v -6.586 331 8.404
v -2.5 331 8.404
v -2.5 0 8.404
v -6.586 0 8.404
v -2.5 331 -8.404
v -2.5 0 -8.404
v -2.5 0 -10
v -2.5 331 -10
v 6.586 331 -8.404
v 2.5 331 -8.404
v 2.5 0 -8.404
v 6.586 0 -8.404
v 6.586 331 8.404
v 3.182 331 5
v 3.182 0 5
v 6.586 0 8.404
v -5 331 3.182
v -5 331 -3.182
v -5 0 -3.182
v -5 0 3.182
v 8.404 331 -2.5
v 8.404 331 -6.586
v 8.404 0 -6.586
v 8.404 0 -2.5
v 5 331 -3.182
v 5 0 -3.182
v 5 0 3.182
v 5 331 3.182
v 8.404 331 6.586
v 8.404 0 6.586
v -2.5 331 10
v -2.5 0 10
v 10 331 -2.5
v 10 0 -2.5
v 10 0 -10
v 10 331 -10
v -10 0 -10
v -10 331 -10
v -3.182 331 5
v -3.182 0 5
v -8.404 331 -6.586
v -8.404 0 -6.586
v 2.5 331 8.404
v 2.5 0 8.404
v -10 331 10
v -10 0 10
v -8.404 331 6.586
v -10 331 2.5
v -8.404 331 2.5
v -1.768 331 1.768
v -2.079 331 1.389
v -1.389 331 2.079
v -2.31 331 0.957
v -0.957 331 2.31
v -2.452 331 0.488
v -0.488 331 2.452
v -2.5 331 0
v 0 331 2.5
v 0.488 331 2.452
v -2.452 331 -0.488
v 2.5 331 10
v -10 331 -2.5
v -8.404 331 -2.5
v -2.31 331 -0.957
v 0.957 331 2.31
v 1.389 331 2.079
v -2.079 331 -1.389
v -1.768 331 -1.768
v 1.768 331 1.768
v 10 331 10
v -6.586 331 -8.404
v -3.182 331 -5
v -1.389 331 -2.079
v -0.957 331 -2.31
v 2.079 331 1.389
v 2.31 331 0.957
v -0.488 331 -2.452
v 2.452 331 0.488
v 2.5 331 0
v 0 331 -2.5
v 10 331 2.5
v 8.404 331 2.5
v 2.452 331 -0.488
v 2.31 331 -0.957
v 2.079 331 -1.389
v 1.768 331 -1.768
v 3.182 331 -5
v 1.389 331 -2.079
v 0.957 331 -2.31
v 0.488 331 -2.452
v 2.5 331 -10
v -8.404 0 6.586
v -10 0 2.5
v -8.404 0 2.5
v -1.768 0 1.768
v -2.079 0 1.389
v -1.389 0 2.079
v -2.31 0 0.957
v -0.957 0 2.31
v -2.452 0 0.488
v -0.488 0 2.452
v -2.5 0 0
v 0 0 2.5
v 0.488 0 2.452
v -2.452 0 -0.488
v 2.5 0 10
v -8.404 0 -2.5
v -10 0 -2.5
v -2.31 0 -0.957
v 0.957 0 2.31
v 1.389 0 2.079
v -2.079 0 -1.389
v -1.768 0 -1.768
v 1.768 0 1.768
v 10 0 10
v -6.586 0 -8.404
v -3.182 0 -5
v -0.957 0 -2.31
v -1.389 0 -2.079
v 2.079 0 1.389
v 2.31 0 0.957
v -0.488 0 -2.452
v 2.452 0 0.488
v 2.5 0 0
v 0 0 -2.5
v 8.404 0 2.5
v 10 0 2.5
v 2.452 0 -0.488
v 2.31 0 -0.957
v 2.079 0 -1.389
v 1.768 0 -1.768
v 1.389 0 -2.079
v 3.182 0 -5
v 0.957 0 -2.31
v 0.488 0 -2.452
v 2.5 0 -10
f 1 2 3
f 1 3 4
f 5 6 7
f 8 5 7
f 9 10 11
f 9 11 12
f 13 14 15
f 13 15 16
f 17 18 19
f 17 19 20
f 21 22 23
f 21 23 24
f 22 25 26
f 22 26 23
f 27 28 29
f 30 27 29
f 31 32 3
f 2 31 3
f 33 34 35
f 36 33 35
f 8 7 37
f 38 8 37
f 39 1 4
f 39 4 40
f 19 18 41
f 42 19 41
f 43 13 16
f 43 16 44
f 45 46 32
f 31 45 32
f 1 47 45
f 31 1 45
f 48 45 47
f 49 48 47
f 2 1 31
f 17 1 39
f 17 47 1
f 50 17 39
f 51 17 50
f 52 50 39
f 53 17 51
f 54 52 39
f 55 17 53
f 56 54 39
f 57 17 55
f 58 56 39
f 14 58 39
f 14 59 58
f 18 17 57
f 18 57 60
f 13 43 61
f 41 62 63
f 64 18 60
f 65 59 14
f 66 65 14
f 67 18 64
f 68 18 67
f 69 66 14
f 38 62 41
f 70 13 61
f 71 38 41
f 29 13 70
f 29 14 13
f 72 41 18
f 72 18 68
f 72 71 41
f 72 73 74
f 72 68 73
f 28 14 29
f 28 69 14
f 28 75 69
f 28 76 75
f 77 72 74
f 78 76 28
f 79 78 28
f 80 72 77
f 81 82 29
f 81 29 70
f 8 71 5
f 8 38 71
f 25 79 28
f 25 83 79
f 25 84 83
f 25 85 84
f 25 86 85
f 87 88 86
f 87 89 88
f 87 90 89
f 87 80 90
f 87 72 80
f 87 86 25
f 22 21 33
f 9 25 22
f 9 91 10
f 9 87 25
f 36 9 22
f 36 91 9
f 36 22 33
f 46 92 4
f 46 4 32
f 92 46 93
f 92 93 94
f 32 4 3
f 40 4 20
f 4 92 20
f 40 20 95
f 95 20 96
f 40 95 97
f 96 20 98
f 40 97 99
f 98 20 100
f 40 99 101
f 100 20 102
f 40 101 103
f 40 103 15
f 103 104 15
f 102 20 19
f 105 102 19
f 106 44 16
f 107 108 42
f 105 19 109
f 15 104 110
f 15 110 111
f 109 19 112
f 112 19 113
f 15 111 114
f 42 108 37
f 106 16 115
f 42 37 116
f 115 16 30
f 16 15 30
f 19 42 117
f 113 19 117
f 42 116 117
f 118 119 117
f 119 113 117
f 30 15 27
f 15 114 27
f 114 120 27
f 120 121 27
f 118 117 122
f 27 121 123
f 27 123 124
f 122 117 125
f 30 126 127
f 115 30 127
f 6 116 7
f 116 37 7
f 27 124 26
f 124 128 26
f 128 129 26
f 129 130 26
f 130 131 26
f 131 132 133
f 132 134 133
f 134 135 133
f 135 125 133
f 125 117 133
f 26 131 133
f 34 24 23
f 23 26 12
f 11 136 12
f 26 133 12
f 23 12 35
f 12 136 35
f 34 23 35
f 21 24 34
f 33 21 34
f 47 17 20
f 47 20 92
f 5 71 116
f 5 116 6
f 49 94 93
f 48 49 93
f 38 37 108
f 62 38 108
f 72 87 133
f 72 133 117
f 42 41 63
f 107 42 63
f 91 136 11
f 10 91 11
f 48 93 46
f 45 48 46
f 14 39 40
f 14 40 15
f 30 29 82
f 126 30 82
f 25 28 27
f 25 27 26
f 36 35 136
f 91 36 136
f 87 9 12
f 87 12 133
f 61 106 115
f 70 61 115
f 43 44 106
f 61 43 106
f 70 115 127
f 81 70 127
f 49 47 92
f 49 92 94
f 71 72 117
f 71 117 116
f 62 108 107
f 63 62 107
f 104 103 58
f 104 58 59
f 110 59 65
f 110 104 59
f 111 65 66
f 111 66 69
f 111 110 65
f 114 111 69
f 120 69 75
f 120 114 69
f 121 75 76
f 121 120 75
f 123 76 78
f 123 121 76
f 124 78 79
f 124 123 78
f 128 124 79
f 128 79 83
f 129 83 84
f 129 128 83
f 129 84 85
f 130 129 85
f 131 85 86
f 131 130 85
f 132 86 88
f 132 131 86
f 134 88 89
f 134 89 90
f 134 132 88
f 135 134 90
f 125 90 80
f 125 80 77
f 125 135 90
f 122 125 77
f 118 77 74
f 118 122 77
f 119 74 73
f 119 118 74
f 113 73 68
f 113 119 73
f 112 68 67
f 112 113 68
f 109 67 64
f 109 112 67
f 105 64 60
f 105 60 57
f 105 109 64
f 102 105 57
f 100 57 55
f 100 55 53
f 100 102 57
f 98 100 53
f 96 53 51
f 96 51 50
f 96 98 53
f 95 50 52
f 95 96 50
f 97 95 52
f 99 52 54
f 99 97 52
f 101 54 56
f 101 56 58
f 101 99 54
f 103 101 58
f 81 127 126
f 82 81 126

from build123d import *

# Parameters (mm, degrees)
SKETCH1_R               = 2.5
BOSS_EXTRUDE1_DEPTH     = 331
ENL_V_MAT_EXTRU_1_DEPTH = 331


with BuildPart() as part:
    # Sketch1 → Boss-Extrude1 (new body)
    with BuildSketch(Plane(origin=(0, 0, 0), x_dir=(1, 0, 0), z_dir=(0, 1, 0))):
        Polygon((2.5, -10), (10, -10), (10, -2.5), (5, -2.5), (5, 2.5), (10, 2.5), (10, 10), (2.5, 10), (2.5, 5), (-2.5, 5), (-2.5, 10), (-10, 10), (-10, 2.5), (-5, 2.5), (-5, -2.5), (-10, -2.5), (-10, -10), (-2.5, -10), (-2.5, -5), (2.5, -5), align=None)
        with Locations(Location((0, 0, 0), (0, 0, 270))):
            Circle(SKETCH1_R, mode=Mode.SUBTRACT)
    extrude(amount=BOSS_EXTRUDE1_DEPTH)

    # Esquisse1 → Enlèv. mat.-Extru.1 (cut)
    with BuildSketch(Plane(origin=(0, 331, 0), x_dir=(1, 0, 0), z_dir=(0, 1, 0))):
        Polygon((-6.585786438, 8.403805922), (-2.5, 8.403805922), (-2.5, 5), (-3.181980515, 5), align=None)
        Polygon((-5, 3.181980515), (-8.403805922, 6.585786438), (-8.403805922, 2.5), (-5, 2.5), align=None)
        Polygon((-3.181980515, -5), (-2.5, -5), (-2.5, -8.403805922), (-6.585786438, -8.403805922), align=None)
        Polygon((-8.403805922, -2.5), (-5, -2.5), (-5, -3.181980515), (-8.403805922, -6.585786438), align=None)
        Polygon((6.585786438, -8.403805922), (2.5, -8.403805922), (2.5, -5), (3.181980515, -5), align=None)
        Polygon((5, -2.5), (5, -3.181980515), (8.403805922, -6.585786438), (8.403805922, -2.5), align=None)
        Polygon((8.403805922, 2.5), (5, 2.5), (5, 3.181980515), (8.403805922, 6.585786438), align=None)
        Polygon((3.181980515, 5), (2.5, 5), (2.5, 8.403805922), (6.585786438, 8.403805922), align=None)
    extrude(amount=-ENL_V_MAT_EXTRU_1_DEPTH, mode=Mode.SUBTRACT)


solid = part.part
